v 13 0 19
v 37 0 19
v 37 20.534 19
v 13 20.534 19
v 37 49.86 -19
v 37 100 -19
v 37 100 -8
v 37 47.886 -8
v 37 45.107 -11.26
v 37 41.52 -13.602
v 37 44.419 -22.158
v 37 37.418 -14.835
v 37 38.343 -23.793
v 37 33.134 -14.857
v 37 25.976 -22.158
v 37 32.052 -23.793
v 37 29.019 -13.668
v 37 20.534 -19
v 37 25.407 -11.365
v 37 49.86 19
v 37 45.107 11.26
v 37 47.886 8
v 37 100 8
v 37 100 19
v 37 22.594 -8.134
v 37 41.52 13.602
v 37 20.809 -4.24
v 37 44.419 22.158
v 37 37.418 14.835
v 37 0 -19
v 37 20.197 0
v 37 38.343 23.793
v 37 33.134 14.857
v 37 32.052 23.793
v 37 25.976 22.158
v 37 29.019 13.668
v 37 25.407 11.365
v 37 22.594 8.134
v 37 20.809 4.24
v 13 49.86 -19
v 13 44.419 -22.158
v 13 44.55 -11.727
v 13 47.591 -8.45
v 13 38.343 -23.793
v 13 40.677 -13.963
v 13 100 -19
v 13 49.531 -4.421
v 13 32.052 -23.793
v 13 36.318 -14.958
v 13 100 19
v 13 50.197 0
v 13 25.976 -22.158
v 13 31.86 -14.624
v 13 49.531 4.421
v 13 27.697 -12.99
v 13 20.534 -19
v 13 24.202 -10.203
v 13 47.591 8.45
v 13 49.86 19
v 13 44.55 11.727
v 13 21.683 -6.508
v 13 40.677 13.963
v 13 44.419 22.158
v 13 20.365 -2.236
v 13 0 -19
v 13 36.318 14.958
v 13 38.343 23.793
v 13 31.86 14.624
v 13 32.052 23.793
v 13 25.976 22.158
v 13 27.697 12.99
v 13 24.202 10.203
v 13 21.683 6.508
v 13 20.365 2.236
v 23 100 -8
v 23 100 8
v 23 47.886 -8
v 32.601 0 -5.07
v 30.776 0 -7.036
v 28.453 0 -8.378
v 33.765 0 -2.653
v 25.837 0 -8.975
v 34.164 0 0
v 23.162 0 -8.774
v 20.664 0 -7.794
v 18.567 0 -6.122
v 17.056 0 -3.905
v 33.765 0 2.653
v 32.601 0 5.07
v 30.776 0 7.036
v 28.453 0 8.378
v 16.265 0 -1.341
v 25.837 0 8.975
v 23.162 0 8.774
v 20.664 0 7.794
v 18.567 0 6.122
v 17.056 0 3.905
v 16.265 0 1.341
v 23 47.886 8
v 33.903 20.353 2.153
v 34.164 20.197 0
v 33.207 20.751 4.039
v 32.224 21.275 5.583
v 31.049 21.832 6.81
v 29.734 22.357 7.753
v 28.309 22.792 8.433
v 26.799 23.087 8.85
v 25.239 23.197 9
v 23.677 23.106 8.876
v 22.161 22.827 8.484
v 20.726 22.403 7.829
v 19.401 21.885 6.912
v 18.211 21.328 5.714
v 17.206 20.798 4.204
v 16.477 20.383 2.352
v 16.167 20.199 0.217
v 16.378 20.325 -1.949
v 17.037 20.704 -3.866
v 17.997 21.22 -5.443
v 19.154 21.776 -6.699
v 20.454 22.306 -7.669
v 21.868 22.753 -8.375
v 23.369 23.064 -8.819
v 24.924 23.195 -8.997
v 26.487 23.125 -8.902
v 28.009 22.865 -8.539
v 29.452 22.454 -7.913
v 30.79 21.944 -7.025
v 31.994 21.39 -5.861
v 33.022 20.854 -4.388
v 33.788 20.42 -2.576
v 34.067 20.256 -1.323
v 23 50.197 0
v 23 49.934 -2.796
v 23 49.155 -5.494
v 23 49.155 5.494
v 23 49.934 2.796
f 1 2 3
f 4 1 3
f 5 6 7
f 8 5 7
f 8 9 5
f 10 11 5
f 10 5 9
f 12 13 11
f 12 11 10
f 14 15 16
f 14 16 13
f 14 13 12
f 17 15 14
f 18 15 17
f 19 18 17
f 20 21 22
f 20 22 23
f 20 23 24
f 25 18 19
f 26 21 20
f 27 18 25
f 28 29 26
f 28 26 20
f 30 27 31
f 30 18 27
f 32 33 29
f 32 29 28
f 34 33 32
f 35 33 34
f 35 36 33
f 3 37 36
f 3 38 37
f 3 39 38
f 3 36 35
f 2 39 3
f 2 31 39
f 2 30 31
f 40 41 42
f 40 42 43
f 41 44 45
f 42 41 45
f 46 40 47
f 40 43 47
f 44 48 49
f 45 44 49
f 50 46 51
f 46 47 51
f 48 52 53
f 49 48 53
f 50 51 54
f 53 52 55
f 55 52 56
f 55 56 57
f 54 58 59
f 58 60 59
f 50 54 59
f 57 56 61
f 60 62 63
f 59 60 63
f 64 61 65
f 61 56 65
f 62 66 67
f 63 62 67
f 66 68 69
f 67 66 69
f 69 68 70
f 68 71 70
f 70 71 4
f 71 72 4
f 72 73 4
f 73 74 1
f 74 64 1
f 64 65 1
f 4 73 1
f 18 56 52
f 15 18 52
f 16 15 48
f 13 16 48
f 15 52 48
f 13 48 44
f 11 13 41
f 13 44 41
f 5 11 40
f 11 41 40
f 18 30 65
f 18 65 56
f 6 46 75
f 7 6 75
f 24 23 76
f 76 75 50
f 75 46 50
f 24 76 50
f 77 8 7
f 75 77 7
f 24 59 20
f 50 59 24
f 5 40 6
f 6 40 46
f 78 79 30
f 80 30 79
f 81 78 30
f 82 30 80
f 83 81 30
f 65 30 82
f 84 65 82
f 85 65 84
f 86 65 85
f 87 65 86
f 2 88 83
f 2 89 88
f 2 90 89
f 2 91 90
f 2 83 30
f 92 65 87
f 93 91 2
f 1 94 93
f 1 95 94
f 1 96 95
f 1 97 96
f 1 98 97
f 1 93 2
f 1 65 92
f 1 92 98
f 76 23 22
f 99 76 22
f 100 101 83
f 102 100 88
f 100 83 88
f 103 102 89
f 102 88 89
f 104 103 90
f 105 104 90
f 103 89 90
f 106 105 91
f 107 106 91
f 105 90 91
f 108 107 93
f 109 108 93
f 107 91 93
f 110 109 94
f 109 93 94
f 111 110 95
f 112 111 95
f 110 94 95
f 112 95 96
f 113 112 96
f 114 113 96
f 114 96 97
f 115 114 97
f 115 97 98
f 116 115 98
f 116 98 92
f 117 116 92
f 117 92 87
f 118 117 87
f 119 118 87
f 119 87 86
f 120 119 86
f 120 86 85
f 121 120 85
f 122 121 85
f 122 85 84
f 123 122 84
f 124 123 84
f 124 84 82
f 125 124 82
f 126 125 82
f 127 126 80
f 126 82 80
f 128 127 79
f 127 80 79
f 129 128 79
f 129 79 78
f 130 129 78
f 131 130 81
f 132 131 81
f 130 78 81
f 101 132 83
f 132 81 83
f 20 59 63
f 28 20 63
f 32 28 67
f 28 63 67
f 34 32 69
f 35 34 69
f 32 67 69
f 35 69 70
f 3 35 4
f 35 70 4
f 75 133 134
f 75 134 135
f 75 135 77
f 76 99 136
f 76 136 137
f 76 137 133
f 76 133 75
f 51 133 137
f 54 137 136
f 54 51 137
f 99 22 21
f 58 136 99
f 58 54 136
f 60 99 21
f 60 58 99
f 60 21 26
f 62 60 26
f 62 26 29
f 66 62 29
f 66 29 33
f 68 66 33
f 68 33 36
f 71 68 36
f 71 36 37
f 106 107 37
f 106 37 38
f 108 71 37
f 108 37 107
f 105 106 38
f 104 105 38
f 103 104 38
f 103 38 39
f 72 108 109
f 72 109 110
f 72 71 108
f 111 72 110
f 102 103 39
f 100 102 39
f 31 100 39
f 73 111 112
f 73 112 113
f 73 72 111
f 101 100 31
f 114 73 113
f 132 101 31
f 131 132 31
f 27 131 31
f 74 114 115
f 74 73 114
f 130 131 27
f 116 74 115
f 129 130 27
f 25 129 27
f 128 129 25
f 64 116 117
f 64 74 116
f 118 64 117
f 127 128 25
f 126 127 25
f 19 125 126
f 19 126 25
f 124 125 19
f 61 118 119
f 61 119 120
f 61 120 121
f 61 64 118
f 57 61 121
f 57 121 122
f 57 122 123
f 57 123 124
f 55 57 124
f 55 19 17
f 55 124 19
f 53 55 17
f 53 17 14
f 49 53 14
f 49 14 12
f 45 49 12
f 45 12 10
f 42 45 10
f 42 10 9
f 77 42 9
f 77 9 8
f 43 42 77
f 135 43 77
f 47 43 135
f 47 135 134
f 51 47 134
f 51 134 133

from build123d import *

# Parameters (mm, degrees)
F0_W      = 24
F0_H      = 38
F1_DEPTH  = 100
F3_R      = 24
F4_DEPTH  = 24
F5_R      = 15
F6_DEPTH  = 25
F7_DEPTH  = 25
F9_DEPTH  = 14
F10_DEPTH = 25
F11_R     = 9
F12_DEPTH = 25


with BuildPart() as f1:
    # F0 (on Front) → F1 (new body)
    with BuildSketch(Plane.XZ):
        Rectangle(F0_W, F0_H)
    extrude(amount=-F1_DEPTH)

    # F3 (on face) → F4 (join)
    with BuildSketch(Plane.YZ.offset(12)):
        with Locations((35.1973697543, 0)):
            Circle(F3_R)
    extrude(amount=-F4_DEPTH)

    # F5 (on face) → F6 (cut)
    with BuildSketch(Plane.YZ.offset(12)):
        with Locations((35.1973697543, 0)):
            Circle(F5_R)
    extrude(amount=-F6_DEPTH, mode=Mode.SUBTRACT)

    # F7 (add): a face of the model
    f7_faces = [f1.faces().sort_by_distance(p)[0] for p in [
        (12, 52.2784311764, 0),
    ]]
    extrude(f7_faces, amount=F7_DEPTH)

    # F8 (on face) → F9 (cut)
    with BuildSketch(Plane.YZ.offset(37)):
        with BuildLine():
            Line((47.8859472948, -8), (100, -8))
            Line((100, -8), (100, 8))
            Line((100, 8), (47.8859472948, 8))
            ThreePointArc((47.8859472948, 8), (49.6079329478, 4.1636124275), (50.1973697543, 0))
            ThreePointArc((50.1973697543, 0), (49.6079329478, -4.1636124275), (47.8859472948, -8))
        make_face()
    extrude(amount=-F9_DEPTH, mode=Mode.SUBTRACT)

    # F10 (cut): a face of the model
    f10_faces = [f1.faces().sort_by_distance(p)[0] for p in [
        (-12, 52.2784311764, 0),
    ]]
    extrude(f10_faces, amount=-F10_DEPTH, mode=Mode.SUBTRACT)

    # F11 (on face) → F12 (cut)
    with BuildSketch(Plane.XZ):
        with Locations((25.1644738019, 0)):
            Circle(F11_R)
    extrude(amount=-F12_DEPTH, mode=Mode.SUBTRACT)


solid = f1.part
